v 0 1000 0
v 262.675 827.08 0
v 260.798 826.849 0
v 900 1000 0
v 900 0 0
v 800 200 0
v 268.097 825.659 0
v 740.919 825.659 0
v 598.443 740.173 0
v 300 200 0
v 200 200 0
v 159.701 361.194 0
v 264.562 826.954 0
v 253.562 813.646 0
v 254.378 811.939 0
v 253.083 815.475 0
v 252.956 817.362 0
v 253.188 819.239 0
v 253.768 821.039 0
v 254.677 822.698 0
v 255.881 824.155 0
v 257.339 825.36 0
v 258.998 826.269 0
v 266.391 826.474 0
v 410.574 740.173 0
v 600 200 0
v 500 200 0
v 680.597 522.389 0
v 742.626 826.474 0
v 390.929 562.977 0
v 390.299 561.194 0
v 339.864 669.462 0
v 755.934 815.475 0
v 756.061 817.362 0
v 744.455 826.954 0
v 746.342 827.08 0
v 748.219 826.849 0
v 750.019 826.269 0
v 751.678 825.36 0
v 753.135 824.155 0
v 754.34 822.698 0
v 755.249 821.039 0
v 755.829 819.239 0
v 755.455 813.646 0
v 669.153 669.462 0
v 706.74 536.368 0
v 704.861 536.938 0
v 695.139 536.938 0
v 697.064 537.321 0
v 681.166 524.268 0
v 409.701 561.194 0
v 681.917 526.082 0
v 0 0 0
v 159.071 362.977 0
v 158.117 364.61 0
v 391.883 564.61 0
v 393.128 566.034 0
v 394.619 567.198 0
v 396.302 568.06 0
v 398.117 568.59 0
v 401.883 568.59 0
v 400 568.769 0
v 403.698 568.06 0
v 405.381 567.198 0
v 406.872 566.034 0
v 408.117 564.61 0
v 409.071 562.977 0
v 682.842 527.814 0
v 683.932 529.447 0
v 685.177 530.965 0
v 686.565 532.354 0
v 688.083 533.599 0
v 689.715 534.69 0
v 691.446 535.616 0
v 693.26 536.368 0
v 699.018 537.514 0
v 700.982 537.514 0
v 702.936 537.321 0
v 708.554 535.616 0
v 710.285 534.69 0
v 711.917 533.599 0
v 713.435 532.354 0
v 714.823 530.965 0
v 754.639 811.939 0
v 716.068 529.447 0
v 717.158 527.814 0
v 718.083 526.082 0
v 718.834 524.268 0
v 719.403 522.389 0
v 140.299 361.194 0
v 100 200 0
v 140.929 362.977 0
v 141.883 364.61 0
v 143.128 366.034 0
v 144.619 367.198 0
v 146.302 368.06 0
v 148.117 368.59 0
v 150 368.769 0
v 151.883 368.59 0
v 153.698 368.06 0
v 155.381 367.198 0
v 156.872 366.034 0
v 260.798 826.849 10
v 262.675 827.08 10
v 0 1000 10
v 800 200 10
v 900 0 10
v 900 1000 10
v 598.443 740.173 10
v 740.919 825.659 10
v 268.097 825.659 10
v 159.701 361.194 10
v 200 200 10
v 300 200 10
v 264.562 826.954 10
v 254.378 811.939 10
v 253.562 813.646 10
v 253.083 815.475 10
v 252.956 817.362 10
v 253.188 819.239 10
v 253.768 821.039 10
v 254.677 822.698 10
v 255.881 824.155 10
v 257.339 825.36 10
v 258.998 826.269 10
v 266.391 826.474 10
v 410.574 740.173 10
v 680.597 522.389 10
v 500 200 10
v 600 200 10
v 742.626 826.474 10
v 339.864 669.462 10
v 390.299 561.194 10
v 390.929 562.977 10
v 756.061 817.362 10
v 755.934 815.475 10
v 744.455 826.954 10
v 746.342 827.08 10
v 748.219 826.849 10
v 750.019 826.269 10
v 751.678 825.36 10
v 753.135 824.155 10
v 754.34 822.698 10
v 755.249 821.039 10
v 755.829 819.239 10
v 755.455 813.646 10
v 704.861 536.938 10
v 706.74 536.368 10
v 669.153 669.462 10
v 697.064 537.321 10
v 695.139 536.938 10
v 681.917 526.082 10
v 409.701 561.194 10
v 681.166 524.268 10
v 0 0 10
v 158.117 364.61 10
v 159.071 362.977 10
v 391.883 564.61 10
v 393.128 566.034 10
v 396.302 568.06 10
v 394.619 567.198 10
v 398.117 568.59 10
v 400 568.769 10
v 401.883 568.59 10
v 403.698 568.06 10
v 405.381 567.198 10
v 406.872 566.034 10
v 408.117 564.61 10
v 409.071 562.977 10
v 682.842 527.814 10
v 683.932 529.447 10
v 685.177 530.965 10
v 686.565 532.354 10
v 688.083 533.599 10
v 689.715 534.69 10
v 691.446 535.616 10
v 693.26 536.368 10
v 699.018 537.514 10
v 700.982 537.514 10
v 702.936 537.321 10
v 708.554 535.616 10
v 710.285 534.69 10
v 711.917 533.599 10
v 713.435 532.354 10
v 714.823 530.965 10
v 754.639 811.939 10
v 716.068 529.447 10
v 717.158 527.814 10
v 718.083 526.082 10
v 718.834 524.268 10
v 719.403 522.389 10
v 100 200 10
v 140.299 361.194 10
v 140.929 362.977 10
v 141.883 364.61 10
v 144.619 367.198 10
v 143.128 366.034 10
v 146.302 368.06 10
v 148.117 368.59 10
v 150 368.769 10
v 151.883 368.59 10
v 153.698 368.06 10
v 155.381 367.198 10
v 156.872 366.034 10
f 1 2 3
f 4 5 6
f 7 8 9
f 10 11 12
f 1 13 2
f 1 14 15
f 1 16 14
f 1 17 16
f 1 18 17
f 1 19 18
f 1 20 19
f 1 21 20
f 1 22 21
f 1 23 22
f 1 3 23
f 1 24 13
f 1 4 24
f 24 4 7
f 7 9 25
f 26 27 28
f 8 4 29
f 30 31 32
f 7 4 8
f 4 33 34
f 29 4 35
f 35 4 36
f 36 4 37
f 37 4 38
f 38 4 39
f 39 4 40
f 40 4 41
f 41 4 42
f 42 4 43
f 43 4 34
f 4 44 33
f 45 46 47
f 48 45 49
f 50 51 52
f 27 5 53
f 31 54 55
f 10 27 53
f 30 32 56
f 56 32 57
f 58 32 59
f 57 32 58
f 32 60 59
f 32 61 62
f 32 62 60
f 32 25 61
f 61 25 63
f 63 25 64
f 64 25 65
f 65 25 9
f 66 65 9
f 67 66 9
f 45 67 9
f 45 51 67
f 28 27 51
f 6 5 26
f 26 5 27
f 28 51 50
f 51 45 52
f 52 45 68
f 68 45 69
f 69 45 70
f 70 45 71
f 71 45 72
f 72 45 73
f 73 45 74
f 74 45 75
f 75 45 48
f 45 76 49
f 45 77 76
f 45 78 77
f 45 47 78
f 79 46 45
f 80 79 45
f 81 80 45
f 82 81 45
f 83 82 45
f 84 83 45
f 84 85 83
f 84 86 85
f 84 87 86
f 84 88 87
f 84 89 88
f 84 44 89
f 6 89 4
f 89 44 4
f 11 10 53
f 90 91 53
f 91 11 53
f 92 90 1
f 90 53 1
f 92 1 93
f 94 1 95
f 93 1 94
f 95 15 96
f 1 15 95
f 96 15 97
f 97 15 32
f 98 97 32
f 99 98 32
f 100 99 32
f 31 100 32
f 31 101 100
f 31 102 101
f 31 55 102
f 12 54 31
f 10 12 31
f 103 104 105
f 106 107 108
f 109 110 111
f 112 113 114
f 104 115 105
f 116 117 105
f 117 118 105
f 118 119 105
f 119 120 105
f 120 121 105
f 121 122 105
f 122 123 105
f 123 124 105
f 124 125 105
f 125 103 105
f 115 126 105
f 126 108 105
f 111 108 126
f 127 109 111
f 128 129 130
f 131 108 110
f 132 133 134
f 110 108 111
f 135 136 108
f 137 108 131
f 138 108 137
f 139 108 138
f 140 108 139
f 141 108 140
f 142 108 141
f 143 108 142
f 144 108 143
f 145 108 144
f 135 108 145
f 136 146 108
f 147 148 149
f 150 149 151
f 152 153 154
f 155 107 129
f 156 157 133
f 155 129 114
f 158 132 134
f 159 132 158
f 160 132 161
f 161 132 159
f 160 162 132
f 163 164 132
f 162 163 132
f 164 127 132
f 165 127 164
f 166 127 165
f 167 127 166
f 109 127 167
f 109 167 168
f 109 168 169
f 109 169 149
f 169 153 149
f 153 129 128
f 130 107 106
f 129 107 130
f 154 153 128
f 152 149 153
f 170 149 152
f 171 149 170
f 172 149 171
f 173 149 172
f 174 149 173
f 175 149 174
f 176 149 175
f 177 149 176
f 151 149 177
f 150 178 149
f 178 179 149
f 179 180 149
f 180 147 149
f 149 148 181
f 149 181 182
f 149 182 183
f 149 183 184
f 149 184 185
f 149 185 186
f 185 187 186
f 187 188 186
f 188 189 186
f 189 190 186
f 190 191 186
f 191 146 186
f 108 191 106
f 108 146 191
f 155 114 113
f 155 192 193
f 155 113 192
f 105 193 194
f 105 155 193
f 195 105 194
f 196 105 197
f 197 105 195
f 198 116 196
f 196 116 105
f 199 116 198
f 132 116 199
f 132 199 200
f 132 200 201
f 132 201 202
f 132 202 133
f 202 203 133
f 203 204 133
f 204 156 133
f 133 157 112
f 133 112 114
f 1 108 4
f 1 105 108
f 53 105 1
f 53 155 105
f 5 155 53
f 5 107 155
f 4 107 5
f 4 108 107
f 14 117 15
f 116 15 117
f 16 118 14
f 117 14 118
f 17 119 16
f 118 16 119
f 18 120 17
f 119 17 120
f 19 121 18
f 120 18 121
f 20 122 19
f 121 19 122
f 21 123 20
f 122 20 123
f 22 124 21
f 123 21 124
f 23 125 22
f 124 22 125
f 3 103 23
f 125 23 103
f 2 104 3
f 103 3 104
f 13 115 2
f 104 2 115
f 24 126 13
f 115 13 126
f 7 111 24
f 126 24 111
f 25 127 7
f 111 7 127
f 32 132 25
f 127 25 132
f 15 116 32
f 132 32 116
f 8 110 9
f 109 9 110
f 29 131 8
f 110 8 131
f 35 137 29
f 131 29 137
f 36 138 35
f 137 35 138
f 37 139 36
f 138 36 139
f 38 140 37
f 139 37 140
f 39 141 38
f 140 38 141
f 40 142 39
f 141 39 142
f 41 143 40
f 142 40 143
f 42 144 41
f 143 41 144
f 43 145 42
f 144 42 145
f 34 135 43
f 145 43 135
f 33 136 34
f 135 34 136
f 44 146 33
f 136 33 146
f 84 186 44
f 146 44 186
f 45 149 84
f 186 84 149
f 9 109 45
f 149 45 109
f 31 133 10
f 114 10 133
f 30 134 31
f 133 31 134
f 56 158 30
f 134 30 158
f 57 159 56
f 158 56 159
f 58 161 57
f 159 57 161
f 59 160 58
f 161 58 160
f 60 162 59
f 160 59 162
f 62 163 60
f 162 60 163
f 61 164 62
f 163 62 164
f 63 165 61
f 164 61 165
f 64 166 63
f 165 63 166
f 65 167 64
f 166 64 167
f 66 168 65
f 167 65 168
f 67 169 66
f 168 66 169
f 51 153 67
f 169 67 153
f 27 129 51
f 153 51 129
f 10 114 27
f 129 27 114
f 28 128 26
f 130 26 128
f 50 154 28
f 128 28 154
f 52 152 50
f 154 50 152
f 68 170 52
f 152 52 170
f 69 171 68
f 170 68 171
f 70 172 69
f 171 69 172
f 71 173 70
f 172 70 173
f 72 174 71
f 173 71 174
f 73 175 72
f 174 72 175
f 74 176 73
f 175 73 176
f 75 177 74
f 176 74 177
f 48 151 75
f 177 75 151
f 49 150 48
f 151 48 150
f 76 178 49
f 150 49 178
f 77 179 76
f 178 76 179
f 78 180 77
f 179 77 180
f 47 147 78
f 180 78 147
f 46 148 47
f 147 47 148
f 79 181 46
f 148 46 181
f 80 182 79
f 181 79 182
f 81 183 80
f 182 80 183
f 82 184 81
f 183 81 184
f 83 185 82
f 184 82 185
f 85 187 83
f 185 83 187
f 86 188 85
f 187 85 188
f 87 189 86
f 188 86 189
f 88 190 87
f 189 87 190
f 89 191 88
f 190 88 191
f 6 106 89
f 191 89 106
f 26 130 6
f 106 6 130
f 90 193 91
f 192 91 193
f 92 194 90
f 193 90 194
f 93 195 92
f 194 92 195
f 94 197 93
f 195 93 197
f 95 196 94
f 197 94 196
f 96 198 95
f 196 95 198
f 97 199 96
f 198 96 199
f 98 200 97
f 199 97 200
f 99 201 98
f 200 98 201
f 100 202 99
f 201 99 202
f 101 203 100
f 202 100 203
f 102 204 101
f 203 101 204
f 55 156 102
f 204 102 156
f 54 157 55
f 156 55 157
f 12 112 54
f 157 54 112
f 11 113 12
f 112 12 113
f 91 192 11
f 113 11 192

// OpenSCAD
// Generated by Parametrix
ca_myPartG_faceTransforms_000 = [ [ 0.0000, 0.0000 ],[ 900.0000, 0.0000 ],[ 900.0000, 1000.0000 ],[ 0.0000, 1000.0000 ],[ 0.0000, 0.0000 ] ];
cb_myPartG_faceTransforms_000 = [  0, 1, 2, 3, 4 ];
ca_myPartG_faceTransforms_001 = [ [ 100.0000, 200.0000 ],[ 200.0000, 200.0000 ],[ 159.7014, 361.1943 ],[ 159.0713, 362.9774 ],[ 158.1167, 364.6100 ],[ 156.8719, 366.0337 ],[ 155.3812, 367.1976 ],[ 153.6981, 368.0600 ],[ 151.8827, 368.5901 ],[ 150.0000, 368.7689 ],[ 148.1173, 368.5901 ],[ 146.3019, 368.0600 ],[ 144.6188, 367.1976 ],[ 143.1281, 366.0337 ],[ 141.8833, 364.6100 ],[ 140.9287, 362.9774 ],[ 140.2986, 361.1943 ],[ 100.0000, 200.0000 ] ];
cb_myPartG_faceTransforms_001 = [  5, 6, 7, 8, 9, 10, 11, 12, 13, 14, 15, 16, 17, 18, 19, 20, 21, 22 ];
ca_myPartG_faceTransforms_002 = [ [ 300.0000, 200.0000 ],[ 500.0000, 200.0000 ],[ 409.7014, 561.1943 ],[ 409.0713, 562.9774 ],[ 408.1167, 564.6100 ],[ 406.8719, 566.0337 ],[ 405.3812, 567.1976 ],[ 403.6981, 568.0600 ],[ 401.8827, 568.5901 ],[ 400.0000, 568.7689 ],[ 398.1173, 568.5901 ],[ 396.3019, 568.0600 ],[ 394.6188, 567.1976 ],[ 393.1281, 566.0337 ],[ 391.8833, 564.6100 ],[ 390.9287, 562.9774 ],[ 390.2986, 561.1943 ],[ 300.0000, 200.0000 ] ];
cb_myPartG_faceTransforms_002 = [  23, 24, 25, 26, 27, 28, 29, 30, 31, 32, 33, 34, 35, 36, 37, 38, 39, 40 ];
ca_myPartG_faceTransforms_003 = [ [ 600.0000, 200.0000 ],[ 800.0000, 200.0000 ],[ 719.4029, 522.3886 ],[ 718.8337, 524.2677 ],[ 718.0831, 526.0819 ],[ 717.1582, 527.8138 ],[ 716.0680, 529.4467 ],[ 714.8229, 530.9648 ],[ 713.4350, 532.3535 ],[ 711.9175, 533.5994 ],[ 710.2853, 534.6905 ],[ 708.5539, 535.6164 ],[ 706.7400, 536.3680 ],[ 704.8612, 536.9381 ],[ 702.9356, 537.3213 ],[ 700.9817, 537.5138 ],[ 699.0183, 537.5138 ],[ 697.0644, 537.3213 ],[ 695.1388, 536.9381 ],[ 693.2600, 536.3680 ],[ 691.4461, 535.6164 ],[ 689.7147, 534.6905 ],[ 688.0825, 533.5994 ],[ 686.5650, 532.3535 ],[ 685.1771, 530.9648 ],[ 683.9320, 529.4467 ],[ 682.8418, 527.8138 ],[ 681.9169, 526.0819 ],[ 681.1663, 524.2677 ],[ 680.5971, 522.3886 ],[ 600.0000, 200.0000 ] ];
cb_myPartG_faceTransforms_003 = [  41, 42, 43, 44, 45, 46, 47, 48, 49, 50, 51, 52, 53, 54, 55, 56, 57, 58, 59, 60, 61, 62, 63, 64, 65, 66, 67, 68, 69, 70, 71 ];
ca_myPartG_faceTransforms_004 = [ [ 339.8638, 669.4622 ],[ 410.5745, 740.1729 ],[ 268.0975, 825.6591 ],[ 266.3911, 826.4744 ],[ 264.5617, 826.9539 ],[ 262.6747, 827.0803 ],[ 260.7977, 826.8492 ],[ 258.9978, 826.2689 ],[ 257.3392, 825.3601 ],[ 255.8815, 824.1552 ],[ 254.6767, 822.6975 ],[ 253.7678, 821.0390 ],[ 253.1875, 819.2390 ],[ 252.9564, 817.3620 ],[ 253.0829, 815.4751 ],[ 253.5623, 813.6456 ],[ 254.3776, 811.9392 ],[ 339.8638, 669.4622 ] ];
cb_myPartG_faceTransforms_004 = [  72, 73, 74, 75, 76, 77, 78, 79, 80, 81, 82, 83, 84, 85, 86, 87, 88, 89 ];
ca_myPartG_faceTransforms_005 = [ [ 598.4425, 740.1729 ],[ 669.1532, 669.4622 ],[ 754.6393, 811.9392 ],[ 755.4547, 813.6456 ],[ 755.9341, 815.4751 ],[ 756.0606, 817.3620 ],[ 755.8295, 819.2390 ],[ 755.2492, 821.0390 ],[ 754.3403, 822.6975 ],[ 753.1355, 824.1552 ],[ 751.6777, 825.3601 ],[ 750.0192, 826.2689 ],[ 748.2193, 826.8492 ],[ 746.3423, 827.0803 ],[ 744.4553, 826.9539 ],[ 742.6259, 826.4744 ],[ 740.9195, 825.6591 ],[ 598.4425, 740.1729 ] ];
cb_myPartG_faceTransforms_005 = [  90, 91, 92, 93, 94, 95, 96, 97, 98, 99, 100, 101, 102, 103, 104, 105, 106, 107 ];
a_myPartG_faceTransforms = concat(ca_myPartG_faceTransforms_000, ca_myPartG_faceTransforms_001, ca_myPartG_faceTransforms_002, ca_myPartG_faceTransforms_003, ca_myPartG_faceTransforms_004, ca_myPartG_faceTransforms_005);
b_myPartG_faceTransforms = [cb_myPartG_faceTransforms_000, cb_myPartG_faceTransforms_001, cb_myPartG_faceTransforms_002, cb_myPartG_faceTransforms_003, cb_myPartG_faceTransforms_004, cb_myPartG_faceTransforms_005];

module subpax_myPartG_tf () {
	translate( [ 0, 0, 0 ])
		rotate( [ 0, 0, 0 ])
			   linear_extrude(height = 10) polygon(a_myPartG_faceTransforms, b_myPartG_faceTransforms);
}

module pax_myPartG () {
	subpax_myPartG_tf();
}

pax_myPartG();
